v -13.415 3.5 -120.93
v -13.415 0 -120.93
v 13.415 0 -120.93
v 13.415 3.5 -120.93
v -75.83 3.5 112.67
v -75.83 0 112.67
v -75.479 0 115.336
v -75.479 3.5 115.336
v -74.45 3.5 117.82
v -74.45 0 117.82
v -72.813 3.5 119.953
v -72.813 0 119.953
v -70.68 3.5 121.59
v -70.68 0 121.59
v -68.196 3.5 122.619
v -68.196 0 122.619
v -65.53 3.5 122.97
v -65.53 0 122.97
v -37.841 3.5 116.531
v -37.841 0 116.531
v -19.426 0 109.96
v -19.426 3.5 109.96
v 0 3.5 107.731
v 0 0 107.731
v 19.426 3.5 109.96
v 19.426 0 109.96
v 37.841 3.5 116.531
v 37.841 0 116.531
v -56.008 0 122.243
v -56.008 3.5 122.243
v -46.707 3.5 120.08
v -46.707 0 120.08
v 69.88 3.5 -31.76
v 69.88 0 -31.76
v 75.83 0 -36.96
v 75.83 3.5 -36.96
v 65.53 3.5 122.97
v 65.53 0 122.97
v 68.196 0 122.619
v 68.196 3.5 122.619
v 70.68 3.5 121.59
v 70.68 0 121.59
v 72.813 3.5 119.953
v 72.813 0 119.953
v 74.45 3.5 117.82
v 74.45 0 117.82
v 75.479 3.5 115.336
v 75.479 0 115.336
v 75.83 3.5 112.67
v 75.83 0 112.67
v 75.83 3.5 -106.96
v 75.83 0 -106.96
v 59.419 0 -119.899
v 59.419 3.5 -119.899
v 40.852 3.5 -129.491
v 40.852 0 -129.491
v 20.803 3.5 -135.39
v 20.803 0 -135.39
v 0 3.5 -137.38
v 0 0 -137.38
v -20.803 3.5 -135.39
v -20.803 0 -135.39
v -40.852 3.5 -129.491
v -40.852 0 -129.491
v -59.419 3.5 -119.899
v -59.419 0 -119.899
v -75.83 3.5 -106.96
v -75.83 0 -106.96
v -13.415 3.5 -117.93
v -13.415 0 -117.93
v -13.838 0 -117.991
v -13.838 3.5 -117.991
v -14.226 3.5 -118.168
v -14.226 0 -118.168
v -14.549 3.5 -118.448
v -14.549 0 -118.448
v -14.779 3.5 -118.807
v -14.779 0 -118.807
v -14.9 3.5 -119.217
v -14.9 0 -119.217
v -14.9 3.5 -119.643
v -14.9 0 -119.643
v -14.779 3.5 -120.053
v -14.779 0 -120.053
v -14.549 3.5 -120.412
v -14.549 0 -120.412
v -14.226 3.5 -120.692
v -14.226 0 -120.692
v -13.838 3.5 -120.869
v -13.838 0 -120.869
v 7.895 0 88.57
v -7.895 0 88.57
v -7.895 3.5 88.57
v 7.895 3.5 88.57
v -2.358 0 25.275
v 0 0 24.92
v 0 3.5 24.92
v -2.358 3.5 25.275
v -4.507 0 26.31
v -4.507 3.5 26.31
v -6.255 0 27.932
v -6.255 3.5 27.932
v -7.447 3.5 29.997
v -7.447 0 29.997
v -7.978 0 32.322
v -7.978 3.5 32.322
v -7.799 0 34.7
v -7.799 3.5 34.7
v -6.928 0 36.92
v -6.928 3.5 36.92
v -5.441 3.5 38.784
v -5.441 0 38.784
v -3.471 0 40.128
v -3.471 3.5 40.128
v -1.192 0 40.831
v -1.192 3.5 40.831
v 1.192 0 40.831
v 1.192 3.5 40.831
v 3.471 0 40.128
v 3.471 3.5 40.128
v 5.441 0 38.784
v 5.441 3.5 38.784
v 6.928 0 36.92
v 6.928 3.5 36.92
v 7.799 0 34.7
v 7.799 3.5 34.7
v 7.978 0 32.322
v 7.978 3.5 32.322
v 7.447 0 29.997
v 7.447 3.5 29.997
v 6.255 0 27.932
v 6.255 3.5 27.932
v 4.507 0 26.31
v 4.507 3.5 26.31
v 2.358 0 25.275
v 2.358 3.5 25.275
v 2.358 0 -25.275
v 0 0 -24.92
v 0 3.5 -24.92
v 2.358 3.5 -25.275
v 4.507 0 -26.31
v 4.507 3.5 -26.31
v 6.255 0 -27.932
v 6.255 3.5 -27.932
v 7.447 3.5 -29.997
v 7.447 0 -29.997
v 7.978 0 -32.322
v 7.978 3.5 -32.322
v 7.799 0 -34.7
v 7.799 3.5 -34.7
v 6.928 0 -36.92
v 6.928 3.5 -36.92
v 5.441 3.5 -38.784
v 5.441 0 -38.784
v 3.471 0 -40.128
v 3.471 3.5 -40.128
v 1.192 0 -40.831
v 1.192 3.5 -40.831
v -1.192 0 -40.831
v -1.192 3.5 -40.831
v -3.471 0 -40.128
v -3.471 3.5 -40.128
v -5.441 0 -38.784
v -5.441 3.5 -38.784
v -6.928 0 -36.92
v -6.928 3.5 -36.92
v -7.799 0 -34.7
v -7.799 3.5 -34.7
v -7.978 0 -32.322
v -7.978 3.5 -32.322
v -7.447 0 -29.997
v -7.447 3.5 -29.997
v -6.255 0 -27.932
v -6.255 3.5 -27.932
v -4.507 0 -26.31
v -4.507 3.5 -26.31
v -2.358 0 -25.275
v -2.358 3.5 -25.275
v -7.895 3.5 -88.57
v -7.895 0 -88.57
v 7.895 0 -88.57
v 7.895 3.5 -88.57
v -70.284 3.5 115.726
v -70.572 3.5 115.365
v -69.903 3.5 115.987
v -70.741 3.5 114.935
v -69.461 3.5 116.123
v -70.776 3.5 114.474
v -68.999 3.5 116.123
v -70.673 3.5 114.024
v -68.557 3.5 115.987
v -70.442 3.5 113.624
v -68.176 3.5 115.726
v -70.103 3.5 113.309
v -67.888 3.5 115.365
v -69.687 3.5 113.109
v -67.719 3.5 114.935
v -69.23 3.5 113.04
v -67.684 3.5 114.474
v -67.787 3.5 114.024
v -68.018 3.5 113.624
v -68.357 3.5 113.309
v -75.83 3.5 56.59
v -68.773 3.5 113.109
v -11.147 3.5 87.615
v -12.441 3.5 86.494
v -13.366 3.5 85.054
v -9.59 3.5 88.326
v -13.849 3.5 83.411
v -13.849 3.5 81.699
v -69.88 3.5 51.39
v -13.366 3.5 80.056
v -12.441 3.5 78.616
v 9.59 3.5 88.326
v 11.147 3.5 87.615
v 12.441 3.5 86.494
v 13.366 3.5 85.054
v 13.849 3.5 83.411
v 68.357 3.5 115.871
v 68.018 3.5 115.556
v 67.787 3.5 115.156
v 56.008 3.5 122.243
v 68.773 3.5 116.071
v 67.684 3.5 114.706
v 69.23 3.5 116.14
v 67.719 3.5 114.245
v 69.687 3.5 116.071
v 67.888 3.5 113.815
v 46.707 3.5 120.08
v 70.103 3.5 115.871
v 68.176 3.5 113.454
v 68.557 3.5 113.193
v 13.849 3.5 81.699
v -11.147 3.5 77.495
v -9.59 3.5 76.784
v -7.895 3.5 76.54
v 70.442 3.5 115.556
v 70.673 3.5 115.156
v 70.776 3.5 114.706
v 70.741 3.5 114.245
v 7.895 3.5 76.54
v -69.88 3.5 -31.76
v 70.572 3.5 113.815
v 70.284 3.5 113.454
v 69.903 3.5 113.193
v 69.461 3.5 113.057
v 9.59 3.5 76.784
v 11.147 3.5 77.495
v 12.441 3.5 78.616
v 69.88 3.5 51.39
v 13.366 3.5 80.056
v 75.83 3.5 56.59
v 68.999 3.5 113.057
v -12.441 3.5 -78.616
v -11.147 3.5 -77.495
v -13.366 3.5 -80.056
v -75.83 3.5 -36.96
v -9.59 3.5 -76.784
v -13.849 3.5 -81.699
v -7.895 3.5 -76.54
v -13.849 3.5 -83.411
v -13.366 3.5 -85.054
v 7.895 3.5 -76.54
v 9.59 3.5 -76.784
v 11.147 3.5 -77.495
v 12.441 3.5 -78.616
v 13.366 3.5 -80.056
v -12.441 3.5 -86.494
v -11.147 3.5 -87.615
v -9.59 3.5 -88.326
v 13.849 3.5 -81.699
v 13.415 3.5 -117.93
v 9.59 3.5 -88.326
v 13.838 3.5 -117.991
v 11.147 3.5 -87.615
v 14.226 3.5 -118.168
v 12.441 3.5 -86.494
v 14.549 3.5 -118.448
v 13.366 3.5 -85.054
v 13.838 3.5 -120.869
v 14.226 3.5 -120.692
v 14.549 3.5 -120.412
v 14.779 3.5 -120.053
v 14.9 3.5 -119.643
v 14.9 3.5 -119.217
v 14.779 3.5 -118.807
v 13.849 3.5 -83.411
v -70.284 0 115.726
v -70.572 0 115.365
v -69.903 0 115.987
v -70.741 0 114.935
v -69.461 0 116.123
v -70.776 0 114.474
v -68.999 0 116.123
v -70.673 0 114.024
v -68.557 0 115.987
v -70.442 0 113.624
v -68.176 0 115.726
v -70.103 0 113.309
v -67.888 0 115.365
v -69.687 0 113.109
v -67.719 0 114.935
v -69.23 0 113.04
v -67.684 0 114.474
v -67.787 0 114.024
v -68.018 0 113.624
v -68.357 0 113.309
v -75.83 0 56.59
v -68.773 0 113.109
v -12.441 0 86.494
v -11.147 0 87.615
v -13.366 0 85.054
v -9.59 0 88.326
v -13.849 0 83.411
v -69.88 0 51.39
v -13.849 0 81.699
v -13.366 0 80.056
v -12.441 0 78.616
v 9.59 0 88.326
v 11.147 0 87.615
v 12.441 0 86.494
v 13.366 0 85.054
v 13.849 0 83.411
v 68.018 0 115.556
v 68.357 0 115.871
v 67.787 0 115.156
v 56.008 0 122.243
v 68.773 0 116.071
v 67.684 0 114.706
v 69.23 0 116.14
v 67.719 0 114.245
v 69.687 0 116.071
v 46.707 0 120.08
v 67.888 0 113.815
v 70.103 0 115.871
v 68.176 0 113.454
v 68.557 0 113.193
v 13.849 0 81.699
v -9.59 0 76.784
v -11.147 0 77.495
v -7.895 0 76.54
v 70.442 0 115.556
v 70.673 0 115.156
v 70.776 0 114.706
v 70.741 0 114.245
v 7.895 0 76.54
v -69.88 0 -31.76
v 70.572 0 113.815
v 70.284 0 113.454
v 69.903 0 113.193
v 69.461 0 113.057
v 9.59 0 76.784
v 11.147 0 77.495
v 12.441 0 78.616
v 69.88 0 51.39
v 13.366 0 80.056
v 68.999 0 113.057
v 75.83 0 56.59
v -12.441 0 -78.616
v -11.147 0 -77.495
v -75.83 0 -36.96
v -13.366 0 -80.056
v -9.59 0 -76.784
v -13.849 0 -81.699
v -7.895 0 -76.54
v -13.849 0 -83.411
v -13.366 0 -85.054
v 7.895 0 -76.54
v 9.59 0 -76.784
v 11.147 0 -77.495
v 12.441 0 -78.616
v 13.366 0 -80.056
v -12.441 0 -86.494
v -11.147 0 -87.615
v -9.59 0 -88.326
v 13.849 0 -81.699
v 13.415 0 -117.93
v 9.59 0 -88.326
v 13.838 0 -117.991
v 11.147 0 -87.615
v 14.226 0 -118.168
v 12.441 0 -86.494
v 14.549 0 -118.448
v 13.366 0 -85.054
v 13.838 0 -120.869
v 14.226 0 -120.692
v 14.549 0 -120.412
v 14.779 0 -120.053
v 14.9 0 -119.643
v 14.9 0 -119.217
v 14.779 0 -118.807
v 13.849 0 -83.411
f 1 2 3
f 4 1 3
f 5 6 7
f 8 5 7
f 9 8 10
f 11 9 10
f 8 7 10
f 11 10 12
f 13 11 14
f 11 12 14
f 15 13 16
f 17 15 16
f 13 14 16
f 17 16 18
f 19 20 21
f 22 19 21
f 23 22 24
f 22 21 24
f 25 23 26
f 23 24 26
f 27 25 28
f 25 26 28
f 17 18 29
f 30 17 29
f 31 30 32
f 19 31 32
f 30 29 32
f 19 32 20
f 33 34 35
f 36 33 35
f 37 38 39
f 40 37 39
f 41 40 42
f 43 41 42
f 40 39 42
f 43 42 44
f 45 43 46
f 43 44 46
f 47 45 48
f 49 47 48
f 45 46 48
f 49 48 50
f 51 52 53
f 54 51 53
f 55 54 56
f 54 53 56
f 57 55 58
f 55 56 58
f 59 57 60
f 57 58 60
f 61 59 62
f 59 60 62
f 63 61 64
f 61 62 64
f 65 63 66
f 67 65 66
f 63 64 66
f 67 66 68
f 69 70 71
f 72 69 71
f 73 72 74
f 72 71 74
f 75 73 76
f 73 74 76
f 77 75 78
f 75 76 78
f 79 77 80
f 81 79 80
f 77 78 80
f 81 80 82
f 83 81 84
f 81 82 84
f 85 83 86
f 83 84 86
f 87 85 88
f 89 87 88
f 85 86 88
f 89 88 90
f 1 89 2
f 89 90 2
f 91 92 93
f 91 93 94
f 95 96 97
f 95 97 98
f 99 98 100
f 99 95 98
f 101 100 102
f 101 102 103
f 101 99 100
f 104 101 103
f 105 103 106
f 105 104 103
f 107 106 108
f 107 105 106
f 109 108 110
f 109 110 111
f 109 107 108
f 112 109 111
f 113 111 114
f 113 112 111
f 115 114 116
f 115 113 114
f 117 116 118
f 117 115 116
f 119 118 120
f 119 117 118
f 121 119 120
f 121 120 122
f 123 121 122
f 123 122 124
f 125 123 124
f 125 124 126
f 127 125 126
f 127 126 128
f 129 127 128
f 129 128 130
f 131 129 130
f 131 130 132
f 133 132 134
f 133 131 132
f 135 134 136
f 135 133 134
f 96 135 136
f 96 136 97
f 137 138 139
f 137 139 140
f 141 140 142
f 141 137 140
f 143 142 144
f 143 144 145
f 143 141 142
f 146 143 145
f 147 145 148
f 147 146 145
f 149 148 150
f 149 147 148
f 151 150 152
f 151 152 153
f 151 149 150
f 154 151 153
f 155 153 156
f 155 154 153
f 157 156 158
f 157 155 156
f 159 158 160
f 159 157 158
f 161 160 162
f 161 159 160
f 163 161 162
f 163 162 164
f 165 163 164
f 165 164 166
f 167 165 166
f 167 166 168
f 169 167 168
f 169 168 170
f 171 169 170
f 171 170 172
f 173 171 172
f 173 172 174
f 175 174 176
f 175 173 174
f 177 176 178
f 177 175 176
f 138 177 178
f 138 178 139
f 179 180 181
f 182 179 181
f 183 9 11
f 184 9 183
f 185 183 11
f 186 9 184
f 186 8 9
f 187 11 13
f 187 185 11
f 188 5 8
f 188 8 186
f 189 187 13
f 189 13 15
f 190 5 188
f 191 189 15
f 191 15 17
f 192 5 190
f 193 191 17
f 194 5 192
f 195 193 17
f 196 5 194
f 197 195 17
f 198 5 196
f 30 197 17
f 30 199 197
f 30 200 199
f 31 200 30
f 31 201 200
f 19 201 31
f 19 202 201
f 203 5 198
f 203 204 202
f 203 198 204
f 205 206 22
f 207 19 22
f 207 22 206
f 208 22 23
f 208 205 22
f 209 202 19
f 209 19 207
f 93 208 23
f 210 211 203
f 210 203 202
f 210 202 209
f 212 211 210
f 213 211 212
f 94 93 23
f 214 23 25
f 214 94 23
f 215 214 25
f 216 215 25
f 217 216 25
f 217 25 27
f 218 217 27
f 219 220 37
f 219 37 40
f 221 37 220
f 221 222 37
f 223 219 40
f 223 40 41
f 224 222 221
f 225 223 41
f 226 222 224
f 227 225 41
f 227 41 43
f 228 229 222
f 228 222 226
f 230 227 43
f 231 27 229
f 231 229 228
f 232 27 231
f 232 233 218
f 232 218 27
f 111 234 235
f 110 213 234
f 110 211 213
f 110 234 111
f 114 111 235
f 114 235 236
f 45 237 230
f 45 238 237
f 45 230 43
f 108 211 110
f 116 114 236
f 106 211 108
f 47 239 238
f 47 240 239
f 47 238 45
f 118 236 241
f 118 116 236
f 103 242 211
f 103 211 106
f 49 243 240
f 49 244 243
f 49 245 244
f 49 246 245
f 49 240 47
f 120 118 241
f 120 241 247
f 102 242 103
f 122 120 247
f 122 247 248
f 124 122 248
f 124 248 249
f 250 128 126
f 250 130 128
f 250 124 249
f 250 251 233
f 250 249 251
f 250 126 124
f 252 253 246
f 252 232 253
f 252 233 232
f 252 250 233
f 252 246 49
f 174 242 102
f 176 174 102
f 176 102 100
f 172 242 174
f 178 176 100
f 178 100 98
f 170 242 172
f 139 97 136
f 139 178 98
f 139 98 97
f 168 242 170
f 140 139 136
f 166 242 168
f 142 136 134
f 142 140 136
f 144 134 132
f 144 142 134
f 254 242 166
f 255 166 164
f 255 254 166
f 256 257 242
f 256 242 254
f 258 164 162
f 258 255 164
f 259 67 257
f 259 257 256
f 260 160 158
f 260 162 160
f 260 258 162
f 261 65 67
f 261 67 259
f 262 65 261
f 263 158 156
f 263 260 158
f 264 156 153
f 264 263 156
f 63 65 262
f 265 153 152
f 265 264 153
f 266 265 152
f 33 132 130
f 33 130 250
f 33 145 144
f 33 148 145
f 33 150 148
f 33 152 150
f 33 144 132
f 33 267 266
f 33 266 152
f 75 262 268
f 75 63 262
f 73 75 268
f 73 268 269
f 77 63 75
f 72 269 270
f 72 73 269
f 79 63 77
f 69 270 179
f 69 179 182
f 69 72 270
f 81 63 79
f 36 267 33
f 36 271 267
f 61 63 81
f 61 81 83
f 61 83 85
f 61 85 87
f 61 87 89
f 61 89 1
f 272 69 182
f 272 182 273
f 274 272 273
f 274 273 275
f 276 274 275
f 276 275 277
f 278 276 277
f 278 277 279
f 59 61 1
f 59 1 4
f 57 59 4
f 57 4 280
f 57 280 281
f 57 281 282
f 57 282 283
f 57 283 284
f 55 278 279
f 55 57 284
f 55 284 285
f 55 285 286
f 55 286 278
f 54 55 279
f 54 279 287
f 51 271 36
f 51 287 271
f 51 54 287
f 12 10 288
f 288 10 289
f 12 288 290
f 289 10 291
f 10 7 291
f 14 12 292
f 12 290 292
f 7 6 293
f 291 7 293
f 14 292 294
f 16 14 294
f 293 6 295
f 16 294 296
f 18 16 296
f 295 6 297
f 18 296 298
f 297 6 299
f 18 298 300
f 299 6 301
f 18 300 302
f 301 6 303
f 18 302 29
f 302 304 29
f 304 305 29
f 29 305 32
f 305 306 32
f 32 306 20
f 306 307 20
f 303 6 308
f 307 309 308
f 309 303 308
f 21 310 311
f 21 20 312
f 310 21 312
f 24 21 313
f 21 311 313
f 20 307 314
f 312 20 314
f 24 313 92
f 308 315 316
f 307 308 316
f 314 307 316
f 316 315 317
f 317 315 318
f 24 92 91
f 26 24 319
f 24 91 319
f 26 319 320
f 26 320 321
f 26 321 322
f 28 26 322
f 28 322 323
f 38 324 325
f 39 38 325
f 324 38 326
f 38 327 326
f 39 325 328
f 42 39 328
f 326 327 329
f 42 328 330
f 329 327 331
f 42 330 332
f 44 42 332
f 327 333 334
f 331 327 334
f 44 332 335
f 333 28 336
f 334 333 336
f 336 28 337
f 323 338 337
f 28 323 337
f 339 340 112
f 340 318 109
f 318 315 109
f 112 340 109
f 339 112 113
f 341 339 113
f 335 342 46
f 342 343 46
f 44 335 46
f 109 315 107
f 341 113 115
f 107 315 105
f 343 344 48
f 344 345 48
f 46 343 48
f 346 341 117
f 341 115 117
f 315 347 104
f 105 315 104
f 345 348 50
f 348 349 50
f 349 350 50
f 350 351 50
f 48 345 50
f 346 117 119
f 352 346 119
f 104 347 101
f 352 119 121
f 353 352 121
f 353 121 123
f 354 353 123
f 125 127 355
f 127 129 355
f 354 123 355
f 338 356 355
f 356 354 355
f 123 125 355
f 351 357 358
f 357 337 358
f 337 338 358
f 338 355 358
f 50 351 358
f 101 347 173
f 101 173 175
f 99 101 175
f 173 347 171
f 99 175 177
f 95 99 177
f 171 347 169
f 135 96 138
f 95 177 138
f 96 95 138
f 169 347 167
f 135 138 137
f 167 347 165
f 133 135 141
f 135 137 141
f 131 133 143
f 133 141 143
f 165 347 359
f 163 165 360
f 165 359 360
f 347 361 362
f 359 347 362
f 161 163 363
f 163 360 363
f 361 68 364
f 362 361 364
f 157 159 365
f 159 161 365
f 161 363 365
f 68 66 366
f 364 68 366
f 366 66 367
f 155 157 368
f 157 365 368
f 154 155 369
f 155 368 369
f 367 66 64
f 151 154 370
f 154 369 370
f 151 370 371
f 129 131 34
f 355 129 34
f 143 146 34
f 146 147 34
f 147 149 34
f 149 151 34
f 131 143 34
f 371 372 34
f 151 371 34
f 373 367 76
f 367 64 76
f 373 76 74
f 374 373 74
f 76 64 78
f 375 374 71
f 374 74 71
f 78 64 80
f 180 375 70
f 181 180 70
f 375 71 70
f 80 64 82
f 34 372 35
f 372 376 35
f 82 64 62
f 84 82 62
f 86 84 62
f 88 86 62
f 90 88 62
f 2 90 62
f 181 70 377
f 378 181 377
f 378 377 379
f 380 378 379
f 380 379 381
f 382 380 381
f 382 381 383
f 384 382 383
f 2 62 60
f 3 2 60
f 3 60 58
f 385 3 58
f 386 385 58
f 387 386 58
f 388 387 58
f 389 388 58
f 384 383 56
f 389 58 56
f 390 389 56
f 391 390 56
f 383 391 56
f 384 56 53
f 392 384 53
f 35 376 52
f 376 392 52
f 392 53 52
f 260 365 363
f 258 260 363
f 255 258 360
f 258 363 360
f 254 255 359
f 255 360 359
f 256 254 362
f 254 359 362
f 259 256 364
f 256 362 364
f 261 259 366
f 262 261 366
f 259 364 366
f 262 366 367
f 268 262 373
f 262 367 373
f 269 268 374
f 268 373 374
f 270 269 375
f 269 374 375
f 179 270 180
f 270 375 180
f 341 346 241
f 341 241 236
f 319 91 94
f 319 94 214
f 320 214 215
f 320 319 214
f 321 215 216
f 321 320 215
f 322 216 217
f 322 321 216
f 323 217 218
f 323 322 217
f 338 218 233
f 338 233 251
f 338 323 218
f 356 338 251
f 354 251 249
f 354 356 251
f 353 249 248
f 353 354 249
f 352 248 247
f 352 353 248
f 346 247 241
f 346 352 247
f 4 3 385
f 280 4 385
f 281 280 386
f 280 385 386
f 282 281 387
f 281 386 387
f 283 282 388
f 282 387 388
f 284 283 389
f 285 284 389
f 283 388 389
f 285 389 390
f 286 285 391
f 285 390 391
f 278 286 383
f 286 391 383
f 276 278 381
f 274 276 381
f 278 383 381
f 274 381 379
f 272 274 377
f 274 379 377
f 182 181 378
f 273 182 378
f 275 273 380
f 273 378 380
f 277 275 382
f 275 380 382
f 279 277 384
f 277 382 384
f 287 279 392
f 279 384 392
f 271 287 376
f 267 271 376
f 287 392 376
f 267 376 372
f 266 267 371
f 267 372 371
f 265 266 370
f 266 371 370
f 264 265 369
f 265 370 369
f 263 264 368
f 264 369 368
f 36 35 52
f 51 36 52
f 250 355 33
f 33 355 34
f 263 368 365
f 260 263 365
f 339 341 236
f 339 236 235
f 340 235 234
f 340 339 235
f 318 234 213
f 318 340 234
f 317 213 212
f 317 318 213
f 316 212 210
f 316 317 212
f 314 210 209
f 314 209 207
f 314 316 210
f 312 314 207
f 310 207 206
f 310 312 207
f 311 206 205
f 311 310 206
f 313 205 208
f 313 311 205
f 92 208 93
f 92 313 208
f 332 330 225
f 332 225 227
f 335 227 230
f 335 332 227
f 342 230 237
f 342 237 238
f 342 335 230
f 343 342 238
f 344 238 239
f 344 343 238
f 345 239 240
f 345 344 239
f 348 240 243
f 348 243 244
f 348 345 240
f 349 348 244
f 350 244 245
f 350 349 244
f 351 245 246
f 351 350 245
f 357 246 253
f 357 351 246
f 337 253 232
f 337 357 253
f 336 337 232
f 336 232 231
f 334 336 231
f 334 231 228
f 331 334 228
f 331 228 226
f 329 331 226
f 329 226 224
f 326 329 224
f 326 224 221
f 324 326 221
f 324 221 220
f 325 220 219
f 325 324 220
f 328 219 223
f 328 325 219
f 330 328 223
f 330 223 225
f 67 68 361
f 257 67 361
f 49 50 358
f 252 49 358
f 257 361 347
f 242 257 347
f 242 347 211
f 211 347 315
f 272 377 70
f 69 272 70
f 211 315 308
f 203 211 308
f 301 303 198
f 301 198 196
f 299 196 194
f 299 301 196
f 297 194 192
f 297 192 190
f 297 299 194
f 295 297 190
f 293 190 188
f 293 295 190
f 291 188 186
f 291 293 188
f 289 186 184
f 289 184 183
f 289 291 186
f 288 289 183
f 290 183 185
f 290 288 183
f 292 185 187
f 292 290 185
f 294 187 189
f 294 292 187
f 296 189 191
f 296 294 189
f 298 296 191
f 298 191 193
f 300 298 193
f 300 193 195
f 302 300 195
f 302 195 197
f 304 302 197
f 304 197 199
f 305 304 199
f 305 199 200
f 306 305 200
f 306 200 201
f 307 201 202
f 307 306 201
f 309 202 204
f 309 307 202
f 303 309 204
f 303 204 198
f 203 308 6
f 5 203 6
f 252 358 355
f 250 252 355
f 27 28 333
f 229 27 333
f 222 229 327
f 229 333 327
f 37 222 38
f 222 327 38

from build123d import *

# Parameters (mm, degrees)
CROQUIS1_R              = 8
CROQUIS1_R_2            = 1.55
SALIENTE_EXTRUIR1_DEPTH = 3.5


with BuildPart() as part:
    # Croquis1 → Saliente-Extruir1 (new body)
    with BuildSketch(Plane(origin=(0, 0, 0), x_dir=(1, 0, 0), z_dir=(0, 1, 0))):
        with BuildLine():
            Line((-75.83, 106.96), (-75.83, 36.96))
            Line((-75.83, 36.96), (-69.88, 31.76))
            Line((-69.88, 31.76), (-69.88, -51.39))
            Line((-69.88, -51.39), (-75.83, -56.59))
            Line((-75.83, -56.59), (-75.83, -112.67))
            ThreePointArc((-75.83, -112.67), (-72.813199846, -119.953199846), (-65.53, -122.97))
            ThreePointArc((-65.53, -122.97), (-51.316231926, -121.339014909), (-37.841336827, -116.530842982))
            ThreePointArc((-37.841336827, -116.530842982), (0, -107.730623626), (37.841336827, -116.530842982))
            ThreePointArc((37.841336827, -116.530842982), (51.316231926, -121.339014909), (65.53, -122.97))
            ThreePointArc((65.53, -122.97), (72.813199846, -119.953199846), (75.83, -112.67))
            Line((75.83, -112.67), (75.83, -56.59))
            Line((75.83, -56.59), (69.88, -51.39))
            Line((69.88, -51.39), (69.88, 31.76))
            Line((69.88, 31.76), (75.83, 36.96))
            Line((75.83, 36.96), (75.83, 106.96))
            ThreePointArc((75.83, 106.96), (0, 137.38), (-75.83, 106.96))
        make_face()
        with Locations(Location((0, 32.92, 0), (0, 0, 270))):
            Circle(CROQUIS1_R, mode=Mode.SUBTRACT)
        with Locations(Location((69.23, -114.59, 0), (0, 0, 270))):
            Circle(CROQUIS1_R_2, mode=Mode.SUBTRACT)
        with Locations(Location((0, -32.92, 0), (0, 0, 90))):
            Circle(CROQUIS1_R, mode=Mode.SUBTRACT)
        with Locations(Location((-69.23, -114.59, 0), (0, 0, 90))):
            Circle(CROQUIS1_R_2, mode=Mode.SUBTRACT)
        with BuildLine():
            Line((-7.895, -88.57), (7.895, -88.57))
            ThreePointArc((7.895, -88.57), (13.91, -82.555), (7.895, -76.54))
            Line((7.895, -76.54), (-7.895, -76.54))
            ThreePointArc((-7.895, -76.54), (-13.91, -82.555), (-7.895, -88.57))
        make_face(mode=Mode.SUBTRACT)
        with BuildLine():
            Line((-7.895, 88.57), (7.895, 88.57))
            ThreePointArc((7.895, 88.57), (13.91, 82.555), (7.895, 76.54))
            Line((7.895, 76.54), (-7.895, 76.54))
            ThreePointArc((-7.895, 76.54), (-13.91, 82.555), (-7.895, 88.57))
        make_face(mode=Mode.SUBTRACT)
        with BuildLine():
            Line((-13.415, 120.93), (13.415, 120.93))
            ThreePointArc((13.415, 120.93), (14.915, 119.43), (13.415, 117.93))
            Line((13.415, 117.93), (-13.415, 117.93))
            ThreePointArc((-13.415, 117.93), (-14.915, 119.43), (-13.415, 120.93))
        make_face(mode=Mode.SUBTRACT)
    extrude(amount=SALIENTE_EXTRUIR1_DEPTH)


solid = part.part
